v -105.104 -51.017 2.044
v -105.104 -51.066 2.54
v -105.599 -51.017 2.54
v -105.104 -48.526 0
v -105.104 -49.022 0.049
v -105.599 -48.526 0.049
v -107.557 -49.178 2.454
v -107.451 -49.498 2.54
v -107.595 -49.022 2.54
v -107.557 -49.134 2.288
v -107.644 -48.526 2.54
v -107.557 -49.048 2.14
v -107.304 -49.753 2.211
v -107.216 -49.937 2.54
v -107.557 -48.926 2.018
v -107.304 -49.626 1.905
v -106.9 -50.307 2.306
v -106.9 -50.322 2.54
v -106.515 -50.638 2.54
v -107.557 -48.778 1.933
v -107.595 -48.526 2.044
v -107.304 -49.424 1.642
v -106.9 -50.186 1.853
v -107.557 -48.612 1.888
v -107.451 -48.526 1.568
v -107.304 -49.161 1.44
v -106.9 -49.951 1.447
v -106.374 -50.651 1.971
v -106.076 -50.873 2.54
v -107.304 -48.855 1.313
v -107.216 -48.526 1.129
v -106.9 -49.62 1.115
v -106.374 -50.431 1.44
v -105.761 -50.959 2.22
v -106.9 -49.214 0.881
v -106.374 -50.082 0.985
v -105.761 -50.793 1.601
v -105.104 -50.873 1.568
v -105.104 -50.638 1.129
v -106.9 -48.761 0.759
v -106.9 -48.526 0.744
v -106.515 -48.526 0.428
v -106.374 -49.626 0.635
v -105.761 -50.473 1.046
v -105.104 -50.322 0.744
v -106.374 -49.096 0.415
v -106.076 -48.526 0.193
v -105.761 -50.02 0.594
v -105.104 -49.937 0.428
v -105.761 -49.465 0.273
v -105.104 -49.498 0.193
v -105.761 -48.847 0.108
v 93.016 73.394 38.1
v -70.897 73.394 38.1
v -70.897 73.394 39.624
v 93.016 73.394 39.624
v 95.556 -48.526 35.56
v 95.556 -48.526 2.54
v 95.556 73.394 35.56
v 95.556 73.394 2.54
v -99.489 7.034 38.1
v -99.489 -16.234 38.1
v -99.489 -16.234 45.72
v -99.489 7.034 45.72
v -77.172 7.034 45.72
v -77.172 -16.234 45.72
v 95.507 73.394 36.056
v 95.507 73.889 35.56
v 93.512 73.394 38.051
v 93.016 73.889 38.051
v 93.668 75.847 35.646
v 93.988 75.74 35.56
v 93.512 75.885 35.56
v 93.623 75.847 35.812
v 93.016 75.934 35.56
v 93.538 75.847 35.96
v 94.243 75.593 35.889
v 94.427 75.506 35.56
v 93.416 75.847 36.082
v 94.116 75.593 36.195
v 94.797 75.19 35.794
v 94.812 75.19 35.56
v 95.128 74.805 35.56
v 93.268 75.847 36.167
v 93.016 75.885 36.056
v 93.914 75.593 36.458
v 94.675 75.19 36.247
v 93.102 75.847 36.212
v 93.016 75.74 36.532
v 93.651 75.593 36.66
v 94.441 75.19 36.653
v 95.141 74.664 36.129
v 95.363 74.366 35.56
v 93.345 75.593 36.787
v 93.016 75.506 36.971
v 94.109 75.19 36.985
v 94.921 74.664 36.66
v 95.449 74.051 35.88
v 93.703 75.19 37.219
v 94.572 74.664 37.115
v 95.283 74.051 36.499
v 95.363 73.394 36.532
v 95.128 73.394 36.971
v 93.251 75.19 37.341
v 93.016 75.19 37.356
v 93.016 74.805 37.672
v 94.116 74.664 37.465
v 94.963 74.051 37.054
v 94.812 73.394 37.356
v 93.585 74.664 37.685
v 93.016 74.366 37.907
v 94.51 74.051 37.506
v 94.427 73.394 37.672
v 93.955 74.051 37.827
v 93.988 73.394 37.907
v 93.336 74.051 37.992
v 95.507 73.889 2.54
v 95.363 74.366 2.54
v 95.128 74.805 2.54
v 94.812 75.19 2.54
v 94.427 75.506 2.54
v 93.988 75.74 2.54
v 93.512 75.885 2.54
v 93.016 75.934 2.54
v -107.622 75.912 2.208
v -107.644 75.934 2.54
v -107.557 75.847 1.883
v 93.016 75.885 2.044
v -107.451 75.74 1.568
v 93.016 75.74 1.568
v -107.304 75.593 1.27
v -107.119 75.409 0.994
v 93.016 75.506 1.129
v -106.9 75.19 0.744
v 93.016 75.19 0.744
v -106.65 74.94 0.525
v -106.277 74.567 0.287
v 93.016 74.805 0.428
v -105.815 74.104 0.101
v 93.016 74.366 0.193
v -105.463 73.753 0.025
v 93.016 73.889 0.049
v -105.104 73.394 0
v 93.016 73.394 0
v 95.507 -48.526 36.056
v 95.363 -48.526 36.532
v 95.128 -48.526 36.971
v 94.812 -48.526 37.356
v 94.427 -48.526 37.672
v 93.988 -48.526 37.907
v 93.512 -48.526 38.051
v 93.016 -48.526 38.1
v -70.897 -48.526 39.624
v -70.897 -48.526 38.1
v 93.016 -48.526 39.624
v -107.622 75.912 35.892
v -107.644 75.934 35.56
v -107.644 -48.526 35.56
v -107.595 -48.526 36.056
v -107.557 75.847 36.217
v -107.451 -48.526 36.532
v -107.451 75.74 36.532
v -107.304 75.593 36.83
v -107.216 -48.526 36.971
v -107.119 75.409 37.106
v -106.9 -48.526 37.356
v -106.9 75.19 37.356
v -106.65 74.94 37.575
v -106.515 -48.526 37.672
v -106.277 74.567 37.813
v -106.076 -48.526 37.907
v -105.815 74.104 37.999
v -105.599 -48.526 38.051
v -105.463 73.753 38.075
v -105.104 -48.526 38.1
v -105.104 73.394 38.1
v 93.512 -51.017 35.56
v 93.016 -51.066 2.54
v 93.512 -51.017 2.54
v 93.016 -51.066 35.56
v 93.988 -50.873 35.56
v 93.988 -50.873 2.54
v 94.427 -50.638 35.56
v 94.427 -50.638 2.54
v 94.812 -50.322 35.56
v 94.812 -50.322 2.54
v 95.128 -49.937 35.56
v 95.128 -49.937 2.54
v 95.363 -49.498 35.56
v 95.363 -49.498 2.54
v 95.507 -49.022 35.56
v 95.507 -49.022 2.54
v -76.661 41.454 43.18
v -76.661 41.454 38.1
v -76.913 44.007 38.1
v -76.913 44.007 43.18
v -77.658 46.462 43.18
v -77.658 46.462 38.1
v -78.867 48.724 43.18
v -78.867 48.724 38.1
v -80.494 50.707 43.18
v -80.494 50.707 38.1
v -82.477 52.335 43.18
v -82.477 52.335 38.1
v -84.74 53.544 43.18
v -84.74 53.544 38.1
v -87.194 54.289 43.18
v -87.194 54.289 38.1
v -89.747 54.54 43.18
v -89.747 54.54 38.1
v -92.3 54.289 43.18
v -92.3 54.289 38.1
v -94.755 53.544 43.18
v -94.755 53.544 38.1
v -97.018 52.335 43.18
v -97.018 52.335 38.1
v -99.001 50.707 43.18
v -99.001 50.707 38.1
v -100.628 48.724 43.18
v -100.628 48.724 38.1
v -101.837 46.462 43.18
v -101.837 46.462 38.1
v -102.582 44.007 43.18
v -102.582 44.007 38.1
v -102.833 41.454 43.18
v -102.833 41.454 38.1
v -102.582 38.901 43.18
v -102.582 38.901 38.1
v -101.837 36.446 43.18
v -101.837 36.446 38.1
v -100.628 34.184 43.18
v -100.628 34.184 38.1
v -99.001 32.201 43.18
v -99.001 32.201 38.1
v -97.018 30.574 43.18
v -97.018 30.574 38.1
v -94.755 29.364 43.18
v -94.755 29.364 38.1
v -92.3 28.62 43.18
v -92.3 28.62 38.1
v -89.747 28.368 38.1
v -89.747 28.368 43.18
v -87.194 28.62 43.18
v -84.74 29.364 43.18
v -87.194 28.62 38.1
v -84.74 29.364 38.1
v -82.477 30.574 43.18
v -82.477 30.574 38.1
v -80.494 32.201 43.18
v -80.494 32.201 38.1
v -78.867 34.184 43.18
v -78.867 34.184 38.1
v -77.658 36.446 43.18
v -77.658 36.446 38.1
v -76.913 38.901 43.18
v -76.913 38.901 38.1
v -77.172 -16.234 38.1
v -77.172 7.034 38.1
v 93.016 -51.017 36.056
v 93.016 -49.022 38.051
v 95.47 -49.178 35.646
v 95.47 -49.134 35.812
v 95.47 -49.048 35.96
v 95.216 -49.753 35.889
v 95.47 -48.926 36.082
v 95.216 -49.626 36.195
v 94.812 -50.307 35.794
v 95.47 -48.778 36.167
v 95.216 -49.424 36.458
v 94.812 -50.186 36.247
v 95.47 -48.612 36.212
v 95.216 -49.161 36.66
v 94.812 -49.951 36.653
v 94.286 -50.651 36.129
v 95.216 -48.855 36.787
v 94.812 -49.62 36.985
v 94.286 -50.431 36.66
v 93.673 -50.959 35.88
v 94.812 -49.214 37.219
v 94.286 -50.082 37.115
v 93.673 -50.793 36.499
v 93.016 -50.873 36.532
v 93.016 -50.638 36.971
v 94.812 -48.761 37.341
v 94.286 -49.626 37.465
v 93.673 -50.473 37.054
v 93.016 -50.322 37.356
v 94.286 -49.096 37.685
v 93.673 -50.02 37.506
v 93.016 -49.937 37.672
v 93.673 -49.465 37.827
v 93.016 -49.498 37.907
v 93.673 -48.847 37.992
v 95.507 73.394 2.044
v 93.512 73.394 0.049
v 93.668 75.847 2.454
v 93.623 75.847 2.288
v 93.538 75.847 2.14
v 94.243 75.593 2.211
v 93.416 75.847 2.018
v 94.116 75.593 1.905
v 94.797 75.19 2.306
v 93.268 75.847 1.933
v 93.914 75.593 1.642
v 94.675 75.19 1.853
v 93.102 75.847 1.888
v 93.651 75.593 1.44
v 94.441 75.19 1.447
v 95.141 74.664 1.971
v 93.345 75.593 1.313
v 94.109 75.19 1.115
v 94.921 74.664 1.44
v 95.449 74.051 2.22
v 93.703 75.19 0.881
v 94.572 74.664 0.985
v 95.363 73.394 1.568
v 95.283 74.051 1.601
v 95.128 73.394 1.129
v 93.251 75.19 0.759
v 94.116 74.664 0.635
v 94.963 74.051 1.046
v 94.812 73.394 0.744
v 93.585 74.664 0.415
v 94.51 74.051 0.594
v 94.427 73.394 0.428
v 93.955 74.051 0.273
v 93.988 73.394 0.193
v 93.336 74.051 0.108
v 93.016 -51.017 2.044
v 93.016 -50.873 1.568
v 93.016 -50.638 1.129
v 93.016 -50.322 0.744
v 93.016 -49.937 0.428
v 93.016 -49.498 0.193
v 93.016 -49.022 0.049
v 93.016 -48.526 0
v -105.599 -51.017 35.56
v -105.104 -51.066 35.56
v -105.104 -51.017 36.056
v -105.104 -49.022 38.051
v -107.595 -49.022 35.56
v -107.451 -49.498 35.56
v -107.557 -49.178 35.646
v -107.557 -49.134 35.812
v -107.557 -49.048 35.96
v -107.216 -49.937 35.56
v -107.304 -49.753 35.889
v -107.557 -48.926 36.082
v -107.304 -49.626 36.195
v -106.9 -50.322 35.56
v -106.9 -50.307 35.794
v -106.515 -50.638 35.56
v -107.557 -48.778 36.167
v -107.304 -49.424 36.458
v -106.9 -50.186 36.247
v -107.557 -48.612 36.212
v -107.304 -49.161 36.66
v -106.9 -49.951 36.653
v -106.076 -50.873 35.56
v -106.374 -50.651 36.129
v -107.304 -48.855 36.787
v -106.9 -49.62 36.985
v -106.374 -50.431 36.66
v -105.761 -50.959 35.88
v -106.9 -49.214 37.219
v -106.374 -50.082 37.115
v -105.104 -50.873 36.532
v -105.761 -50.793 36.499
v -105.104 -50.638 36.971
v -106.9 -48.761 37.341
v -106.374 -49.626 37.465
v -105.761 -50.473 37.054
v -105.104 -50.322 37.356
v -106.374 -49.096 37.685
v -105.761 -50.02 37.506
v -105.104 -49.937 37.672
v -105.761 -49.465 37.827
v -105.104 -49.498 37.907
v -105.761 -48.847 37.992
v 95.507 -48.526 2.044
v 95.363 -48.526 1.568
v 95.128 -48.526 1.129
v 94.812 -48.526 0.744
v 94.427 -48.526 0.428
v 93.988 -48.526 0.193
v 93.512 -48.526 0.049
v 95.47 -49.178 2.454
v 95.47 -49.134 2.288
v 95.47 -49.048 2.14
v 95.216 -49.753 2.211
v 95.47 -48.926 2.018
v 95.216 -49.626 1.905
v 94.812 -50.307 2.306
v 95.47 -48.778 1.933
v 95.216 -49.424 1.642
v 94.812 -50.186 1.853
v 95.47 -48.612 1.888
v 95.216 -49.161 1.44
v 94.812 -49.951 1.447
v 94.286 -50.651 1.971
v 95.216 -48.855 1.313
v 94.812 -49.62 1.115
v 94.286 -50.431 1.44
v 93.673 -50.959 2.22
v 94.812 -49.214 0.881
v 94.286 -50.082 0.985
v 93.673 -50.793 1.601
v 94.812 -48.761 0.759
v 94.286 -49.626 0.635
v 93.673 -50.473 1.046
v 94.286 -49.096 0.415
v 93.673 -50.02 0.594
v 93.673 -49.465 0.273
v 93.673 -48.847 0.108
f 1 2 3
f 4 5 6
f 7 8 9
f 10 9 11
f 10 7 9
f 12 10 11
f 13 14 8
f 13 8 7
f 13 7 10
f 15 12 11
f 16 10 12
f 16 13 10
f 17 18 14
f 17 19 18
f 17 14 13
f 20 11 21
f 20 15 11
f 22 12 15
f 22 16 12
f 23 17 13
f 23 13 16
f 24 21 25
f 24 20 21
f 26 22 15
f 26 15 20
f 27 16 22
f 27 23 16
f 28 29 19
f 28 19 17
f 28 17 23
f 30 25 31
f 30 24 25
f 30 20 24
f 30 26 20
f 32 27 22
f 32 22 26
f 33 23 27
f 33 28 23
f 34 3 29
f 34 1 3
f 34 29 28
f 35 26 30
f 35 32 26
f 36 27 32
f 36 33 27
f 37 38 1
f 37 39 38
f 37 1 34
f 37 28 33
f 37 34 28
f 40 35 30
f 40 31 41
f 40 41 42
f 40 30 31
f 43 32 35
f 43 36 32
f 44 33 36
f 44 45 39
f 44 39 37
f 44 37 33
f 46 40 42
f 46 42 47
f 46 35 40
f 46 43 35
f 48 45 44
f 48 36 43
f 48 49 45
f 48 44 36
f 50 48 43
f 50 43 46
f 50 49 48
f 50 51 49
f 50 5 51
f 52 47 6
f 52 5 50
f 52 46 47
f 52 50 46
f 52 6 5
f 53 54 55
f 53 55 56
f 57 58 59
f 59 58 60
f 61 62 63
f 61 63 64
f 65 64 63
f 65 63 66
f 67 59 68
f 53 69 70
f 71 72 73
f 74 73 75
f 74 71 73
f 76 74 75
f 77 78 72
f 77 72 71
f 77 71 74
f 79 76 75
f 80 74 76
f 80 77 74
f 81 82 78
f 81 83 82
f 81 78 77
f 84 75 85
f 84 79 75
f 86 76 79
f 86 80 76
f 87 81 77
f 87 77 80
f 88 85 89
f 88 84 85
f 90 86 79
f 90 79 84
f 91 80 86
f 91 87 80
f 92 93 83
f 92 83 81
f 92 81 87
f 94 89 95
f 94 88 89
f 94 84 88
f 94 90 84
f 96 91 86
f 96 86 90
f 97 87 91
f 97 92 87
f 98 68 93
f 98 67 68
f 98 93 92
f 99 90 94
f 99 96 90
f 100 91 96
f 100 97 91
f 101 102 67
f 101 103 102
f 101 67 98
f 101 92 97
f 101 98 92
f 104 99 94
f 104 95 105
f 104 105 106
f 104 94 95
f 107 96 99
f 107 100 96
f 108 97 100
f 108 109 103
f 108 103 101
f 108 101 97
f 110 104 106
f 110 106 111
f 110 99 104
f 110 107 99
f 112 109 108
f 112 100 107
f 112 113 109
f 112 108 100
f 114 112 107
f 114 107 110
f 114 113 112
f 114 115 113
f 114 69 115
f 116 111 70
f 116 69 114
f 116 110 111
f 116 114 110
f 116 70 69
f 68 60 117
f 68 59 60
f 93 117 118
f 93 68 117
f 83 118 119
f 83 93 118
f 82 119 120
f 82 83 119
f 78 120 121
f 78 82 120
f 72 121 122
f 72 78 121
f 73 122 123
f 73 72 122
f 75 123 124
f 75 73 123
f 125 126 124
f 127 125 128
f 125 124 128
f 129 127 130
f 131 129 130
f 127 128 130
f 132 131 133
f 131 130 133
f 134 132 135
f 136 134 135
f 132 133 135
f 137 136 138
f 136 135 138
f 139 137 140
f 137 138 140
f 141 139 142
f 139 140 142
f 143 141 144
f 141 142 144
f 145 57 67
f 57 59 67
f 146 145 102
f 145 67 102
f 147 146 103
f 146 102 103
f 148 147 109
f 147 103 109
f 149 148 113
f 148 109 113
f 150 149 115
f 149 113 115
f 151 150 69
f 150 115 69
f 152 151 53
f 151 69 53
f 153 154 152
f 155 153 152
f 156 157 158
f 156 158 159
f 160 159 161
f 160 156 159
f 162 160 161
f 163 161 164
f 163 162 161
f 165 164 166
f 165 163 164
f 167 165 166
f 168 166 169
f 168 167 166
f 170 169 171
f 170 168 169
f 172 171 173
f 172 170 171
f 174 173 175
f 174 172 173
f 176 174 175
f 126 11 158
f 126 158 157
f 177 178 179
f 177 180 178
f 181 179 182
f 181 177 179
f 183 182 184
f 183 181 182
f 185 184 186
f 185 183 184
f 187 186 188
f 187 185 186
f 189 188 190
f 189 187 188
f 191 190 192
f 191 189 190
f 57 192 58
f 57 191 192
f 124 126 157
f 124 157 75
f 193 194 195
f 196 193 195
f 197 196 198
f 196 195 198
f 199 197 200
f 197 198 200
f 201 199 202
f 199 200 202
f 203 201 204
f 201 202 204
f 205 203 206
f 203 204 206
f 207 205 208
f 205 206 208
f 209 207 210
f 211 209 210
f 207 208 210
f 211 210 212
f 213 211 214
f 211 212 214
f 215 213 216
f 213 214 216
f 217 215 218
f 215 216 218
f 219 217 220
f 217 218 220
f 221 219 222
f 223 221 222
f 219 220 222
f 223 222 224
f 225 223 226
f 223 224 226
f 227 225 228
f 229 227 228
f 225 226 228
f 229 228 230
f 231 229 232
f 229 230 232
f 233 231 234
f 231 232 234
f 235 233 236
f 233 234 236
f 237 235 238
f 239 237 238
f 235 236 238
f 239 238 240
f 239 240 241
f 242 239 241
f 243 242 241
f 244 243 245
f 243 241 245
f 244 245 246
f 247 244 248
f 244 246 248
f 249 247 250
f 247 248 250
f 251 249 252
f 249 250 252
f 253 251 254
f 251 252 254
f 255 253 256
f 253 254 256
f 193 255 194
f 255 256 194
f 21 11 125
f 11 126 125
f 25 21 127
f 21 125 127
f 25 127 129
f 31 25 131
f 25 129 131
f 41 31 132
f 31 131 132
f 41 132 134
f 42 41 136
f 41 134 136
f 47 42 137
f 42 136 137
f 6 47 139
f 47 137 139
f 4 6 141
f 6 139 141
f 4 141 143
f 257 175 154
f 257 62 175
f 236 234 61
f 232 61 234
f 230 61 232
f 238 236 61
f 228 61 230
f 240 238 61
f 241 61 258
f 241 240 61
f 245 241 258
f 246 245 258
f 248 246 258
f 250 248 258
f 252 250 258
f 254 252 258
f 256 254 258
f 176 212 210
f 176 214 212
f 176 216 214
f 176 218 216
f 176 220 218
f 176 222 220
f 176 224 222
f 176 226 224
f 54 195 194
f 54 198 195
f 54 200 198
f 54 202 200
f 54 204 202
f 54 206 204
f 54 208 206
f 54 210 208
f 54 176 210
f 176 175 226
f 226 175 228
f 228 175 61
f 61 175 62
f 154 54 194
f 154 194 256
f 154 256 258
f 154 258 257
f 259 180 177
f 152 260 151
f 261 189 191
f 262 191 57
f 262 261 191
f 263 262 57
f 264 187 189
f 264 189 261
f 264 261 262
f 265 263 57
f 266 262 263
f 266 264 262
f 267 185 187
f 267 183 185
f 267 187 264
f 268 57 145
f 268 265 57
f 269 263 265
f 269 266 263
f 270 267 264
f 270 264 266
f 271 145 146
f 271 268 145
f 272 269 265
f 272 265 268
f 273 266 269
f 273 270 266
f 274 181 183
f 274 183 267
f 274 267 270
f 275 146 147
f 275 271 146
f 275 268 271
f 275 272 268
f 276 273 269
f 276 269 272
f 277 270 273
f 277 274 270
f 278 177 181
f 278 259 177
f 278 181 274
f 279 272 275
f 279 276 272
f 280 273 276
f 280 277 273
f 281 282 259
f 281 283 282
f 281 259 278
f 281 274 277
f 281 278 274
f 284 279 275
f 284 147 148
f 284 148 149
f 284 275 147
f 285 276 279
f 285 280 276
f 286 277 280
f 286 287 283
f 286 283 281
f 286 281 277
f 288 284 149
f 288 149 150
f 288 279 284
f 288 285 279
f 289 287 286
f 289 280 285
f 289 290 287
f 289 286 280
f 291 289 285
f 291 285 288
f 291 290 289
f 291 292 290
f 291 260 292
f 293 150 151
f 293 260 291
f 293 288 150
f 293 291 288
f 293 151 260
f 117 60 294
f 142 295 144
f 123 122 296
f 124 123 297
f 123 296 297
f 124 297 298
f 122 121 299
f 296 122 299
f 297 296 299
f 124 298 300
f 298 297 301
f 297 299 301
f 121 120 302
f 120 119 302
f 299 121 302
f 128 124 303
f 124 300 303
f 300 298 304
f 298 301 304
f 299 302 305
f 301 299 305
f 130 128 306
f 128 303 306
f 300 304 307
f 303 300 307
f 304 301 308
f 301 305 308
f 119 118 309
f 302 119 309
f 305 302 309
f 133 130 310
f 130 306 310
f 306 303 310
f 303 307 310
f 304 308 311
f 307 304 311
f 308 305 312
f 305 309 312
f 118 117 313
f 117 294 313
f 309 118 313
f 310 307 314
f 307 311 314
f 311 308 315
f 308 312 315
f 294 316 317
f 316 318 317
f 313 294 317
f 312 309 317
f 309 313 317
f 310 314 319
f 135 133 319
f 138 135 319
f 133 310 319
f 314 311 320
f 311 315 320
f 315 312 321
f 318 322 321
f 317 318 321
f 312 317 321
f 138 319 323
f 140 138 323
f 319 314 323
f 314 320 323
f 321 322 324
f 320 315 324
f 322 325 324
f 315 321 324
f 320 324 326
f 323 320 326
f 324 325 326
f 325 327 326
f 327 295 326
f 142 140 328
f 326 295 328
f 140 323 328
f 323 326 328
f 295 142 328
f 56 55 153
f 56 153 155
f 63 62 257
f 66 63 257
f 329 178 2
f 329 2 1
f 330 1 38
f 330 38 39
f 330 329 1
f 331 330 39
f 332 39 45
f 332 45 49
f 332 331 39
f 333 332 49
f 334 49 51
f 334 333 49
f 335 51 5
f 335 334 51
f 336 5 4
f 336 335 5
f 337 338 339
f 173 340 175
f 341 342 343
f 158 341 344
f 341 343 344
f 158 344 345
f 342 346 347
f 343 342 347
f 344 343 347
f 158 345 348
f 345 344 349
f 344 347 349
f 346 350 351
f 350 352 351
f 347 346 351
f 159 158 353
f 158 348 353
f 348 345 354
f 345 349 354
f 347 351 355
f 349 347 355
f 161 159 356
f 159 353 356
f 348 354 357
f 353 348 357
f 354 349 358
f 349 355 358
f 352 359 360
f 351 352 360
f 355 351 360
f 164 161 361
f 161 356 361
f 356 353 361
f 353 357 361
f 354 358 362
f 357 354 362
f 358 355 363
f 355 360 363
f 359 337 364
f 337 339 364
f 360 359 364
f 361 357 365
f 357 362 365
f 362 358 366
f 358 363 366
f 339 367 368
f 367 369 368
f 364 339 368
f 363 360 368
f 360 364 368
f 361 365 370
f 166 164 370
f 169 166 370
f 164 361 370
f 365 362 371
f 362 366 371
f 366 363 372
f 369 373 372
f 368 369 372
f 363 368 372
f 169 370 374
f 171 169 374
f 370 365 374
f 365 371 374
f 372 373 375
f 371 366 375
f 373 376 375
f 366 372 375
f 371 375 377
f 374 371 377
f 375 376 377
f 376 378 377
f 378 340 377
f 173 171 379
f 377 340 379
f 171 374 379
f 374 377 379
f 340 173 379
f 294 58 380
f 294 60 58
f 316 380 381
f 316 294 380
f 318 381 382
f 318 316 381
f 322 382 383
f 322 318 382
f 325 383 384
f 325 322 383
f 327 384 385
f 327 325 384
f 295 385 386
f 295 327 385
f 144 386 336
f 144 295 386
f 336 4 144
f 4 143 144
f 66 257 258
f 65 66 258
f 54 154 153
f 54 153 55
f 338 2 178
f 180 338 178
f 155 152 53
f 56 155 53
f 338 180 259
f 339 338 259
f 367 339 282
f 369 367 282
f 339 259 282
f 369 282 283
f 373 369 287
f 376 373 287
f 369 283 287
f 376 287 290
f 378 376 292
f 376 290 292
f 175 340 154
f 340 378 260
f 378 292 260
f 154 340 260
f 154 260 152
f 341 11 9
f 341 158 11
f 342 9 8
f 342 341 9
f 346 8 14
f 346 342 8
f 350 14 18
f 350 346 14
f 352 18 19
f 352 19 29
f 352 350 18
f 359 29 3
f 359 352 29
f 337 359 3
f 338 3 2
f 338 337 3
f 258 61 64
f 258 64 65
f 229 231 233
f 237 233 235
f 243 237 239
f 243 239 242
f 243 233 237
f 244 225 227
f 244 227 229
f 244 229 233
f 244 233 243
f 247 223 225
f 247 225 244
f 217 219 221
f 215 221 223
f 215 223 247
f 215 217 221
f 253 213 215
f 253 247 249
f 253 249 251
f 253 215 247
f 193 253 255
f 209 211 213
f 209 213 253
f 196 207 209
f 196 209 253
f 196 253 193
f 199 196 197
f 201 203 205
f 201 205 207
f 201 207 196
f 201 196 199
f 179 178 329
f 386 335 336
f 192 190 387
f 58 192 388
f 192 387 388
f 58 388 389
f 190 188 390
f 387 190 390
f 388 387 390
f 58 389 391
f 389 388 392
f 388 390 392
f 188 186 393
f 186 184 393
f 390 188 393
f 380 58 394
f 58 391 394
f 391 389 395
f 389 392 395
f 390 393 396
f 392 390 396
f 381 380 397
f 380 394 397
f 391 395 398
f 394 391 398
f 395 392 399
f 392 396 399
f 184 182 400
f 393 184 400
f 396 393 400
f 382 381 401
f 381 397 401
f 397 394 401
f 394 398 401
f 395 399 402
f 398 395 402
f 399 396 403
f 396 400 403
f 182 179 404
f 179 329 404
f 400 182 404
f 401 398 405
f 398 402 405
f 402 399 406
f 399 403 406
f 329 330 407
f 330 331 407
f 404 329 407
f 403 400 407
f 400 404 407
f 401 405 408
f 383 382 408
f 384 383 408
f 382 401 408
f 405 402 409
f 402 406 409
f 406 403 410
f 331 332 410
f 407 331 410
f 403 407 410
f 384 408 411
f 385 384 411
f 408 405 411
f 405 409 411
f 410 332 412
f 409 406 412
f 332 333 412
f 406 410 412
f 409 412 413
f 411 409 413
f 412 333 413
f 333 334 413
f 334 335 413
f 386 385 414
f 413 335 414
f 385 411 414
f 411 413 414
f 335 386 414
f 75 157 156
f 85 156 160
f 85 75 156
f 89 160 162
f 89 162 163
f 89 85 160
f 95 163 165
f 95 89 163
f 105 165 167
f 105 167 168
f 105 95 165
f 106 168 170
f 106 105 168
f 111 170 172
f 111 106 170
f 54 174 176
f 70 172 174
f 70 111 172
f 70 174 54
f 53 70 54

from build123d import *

# Parameters (mm, degrees)
F0_W     = 203.2
F0_H     = 127
F1_DEPTH = 38.1
F2_R     = 2.54
F3_R     = 13.086022
F4_DEPTH = 5.08
F5_W     = 22.316434
F5_H     = 23.267692
F6_DEPTH = 7.62
F7_W     = 163.913434
F7_H     = 121.92
F8_DEPTH = 1.524


with BuildPart() as f1:
    # F0 (on Top) → F1 (new body)
    with BuildSketch(Plane.XY):
        with Locations((-6.043922, 12.433724)):
            Rectangle(F0_W, F0_H)
    extrude(amount=F1_DEPTH)

    # F2
    f2_edges = [f1.edges().sort_by_distance(p)[0] for p in [
        (-6.043922, -51.066276, 0),
        (-6.043922, -51.066276, 38.1),
        (-107.643922, -51.066276, 19.05),
        (95.556078, -51.066276, 19.05),
        (95.556078, 12.433724, 38.1),
        (95.556078, 12.433724, 0),
        (95.556078, 75.933724, 19.05),
        (-6.043922, 75.933724, 38.1),
        (-107.643922, 12.433724, 38.1),
        (-6.043922, 75.933724, 0),
        (-107.643922, 12.433724, 0),
    ]]
    fillet(f2_edges, radius=F2_R)

    # F3 (on face) → F4 (join)
    with BuildSketch(Plane.XY.offset(38.1)):
        with Locations((-89.747429, 41.45414)):
            Circle(F3_R)
    extrude(amount=F4_DEPTH)

    # F5 (on face) → F6 (join)
    with BuildSketch(Plane.XY.offset(38.1)):
        with Locations((-88.330593, -4.60028)):
            Rectangle(F5_W, F5_H)
    extrude(amount=F6_DEPTH)

    # F7 (on face) → F8 (join)
    with BuildSketch(Plane.XY.offset(38.1)):
        with Locations((11.059361, 12.433724)):
            Rectangle(F7_W, F7_H)
    extrude(amount=F8_DEPTH)


solid = f1.part
